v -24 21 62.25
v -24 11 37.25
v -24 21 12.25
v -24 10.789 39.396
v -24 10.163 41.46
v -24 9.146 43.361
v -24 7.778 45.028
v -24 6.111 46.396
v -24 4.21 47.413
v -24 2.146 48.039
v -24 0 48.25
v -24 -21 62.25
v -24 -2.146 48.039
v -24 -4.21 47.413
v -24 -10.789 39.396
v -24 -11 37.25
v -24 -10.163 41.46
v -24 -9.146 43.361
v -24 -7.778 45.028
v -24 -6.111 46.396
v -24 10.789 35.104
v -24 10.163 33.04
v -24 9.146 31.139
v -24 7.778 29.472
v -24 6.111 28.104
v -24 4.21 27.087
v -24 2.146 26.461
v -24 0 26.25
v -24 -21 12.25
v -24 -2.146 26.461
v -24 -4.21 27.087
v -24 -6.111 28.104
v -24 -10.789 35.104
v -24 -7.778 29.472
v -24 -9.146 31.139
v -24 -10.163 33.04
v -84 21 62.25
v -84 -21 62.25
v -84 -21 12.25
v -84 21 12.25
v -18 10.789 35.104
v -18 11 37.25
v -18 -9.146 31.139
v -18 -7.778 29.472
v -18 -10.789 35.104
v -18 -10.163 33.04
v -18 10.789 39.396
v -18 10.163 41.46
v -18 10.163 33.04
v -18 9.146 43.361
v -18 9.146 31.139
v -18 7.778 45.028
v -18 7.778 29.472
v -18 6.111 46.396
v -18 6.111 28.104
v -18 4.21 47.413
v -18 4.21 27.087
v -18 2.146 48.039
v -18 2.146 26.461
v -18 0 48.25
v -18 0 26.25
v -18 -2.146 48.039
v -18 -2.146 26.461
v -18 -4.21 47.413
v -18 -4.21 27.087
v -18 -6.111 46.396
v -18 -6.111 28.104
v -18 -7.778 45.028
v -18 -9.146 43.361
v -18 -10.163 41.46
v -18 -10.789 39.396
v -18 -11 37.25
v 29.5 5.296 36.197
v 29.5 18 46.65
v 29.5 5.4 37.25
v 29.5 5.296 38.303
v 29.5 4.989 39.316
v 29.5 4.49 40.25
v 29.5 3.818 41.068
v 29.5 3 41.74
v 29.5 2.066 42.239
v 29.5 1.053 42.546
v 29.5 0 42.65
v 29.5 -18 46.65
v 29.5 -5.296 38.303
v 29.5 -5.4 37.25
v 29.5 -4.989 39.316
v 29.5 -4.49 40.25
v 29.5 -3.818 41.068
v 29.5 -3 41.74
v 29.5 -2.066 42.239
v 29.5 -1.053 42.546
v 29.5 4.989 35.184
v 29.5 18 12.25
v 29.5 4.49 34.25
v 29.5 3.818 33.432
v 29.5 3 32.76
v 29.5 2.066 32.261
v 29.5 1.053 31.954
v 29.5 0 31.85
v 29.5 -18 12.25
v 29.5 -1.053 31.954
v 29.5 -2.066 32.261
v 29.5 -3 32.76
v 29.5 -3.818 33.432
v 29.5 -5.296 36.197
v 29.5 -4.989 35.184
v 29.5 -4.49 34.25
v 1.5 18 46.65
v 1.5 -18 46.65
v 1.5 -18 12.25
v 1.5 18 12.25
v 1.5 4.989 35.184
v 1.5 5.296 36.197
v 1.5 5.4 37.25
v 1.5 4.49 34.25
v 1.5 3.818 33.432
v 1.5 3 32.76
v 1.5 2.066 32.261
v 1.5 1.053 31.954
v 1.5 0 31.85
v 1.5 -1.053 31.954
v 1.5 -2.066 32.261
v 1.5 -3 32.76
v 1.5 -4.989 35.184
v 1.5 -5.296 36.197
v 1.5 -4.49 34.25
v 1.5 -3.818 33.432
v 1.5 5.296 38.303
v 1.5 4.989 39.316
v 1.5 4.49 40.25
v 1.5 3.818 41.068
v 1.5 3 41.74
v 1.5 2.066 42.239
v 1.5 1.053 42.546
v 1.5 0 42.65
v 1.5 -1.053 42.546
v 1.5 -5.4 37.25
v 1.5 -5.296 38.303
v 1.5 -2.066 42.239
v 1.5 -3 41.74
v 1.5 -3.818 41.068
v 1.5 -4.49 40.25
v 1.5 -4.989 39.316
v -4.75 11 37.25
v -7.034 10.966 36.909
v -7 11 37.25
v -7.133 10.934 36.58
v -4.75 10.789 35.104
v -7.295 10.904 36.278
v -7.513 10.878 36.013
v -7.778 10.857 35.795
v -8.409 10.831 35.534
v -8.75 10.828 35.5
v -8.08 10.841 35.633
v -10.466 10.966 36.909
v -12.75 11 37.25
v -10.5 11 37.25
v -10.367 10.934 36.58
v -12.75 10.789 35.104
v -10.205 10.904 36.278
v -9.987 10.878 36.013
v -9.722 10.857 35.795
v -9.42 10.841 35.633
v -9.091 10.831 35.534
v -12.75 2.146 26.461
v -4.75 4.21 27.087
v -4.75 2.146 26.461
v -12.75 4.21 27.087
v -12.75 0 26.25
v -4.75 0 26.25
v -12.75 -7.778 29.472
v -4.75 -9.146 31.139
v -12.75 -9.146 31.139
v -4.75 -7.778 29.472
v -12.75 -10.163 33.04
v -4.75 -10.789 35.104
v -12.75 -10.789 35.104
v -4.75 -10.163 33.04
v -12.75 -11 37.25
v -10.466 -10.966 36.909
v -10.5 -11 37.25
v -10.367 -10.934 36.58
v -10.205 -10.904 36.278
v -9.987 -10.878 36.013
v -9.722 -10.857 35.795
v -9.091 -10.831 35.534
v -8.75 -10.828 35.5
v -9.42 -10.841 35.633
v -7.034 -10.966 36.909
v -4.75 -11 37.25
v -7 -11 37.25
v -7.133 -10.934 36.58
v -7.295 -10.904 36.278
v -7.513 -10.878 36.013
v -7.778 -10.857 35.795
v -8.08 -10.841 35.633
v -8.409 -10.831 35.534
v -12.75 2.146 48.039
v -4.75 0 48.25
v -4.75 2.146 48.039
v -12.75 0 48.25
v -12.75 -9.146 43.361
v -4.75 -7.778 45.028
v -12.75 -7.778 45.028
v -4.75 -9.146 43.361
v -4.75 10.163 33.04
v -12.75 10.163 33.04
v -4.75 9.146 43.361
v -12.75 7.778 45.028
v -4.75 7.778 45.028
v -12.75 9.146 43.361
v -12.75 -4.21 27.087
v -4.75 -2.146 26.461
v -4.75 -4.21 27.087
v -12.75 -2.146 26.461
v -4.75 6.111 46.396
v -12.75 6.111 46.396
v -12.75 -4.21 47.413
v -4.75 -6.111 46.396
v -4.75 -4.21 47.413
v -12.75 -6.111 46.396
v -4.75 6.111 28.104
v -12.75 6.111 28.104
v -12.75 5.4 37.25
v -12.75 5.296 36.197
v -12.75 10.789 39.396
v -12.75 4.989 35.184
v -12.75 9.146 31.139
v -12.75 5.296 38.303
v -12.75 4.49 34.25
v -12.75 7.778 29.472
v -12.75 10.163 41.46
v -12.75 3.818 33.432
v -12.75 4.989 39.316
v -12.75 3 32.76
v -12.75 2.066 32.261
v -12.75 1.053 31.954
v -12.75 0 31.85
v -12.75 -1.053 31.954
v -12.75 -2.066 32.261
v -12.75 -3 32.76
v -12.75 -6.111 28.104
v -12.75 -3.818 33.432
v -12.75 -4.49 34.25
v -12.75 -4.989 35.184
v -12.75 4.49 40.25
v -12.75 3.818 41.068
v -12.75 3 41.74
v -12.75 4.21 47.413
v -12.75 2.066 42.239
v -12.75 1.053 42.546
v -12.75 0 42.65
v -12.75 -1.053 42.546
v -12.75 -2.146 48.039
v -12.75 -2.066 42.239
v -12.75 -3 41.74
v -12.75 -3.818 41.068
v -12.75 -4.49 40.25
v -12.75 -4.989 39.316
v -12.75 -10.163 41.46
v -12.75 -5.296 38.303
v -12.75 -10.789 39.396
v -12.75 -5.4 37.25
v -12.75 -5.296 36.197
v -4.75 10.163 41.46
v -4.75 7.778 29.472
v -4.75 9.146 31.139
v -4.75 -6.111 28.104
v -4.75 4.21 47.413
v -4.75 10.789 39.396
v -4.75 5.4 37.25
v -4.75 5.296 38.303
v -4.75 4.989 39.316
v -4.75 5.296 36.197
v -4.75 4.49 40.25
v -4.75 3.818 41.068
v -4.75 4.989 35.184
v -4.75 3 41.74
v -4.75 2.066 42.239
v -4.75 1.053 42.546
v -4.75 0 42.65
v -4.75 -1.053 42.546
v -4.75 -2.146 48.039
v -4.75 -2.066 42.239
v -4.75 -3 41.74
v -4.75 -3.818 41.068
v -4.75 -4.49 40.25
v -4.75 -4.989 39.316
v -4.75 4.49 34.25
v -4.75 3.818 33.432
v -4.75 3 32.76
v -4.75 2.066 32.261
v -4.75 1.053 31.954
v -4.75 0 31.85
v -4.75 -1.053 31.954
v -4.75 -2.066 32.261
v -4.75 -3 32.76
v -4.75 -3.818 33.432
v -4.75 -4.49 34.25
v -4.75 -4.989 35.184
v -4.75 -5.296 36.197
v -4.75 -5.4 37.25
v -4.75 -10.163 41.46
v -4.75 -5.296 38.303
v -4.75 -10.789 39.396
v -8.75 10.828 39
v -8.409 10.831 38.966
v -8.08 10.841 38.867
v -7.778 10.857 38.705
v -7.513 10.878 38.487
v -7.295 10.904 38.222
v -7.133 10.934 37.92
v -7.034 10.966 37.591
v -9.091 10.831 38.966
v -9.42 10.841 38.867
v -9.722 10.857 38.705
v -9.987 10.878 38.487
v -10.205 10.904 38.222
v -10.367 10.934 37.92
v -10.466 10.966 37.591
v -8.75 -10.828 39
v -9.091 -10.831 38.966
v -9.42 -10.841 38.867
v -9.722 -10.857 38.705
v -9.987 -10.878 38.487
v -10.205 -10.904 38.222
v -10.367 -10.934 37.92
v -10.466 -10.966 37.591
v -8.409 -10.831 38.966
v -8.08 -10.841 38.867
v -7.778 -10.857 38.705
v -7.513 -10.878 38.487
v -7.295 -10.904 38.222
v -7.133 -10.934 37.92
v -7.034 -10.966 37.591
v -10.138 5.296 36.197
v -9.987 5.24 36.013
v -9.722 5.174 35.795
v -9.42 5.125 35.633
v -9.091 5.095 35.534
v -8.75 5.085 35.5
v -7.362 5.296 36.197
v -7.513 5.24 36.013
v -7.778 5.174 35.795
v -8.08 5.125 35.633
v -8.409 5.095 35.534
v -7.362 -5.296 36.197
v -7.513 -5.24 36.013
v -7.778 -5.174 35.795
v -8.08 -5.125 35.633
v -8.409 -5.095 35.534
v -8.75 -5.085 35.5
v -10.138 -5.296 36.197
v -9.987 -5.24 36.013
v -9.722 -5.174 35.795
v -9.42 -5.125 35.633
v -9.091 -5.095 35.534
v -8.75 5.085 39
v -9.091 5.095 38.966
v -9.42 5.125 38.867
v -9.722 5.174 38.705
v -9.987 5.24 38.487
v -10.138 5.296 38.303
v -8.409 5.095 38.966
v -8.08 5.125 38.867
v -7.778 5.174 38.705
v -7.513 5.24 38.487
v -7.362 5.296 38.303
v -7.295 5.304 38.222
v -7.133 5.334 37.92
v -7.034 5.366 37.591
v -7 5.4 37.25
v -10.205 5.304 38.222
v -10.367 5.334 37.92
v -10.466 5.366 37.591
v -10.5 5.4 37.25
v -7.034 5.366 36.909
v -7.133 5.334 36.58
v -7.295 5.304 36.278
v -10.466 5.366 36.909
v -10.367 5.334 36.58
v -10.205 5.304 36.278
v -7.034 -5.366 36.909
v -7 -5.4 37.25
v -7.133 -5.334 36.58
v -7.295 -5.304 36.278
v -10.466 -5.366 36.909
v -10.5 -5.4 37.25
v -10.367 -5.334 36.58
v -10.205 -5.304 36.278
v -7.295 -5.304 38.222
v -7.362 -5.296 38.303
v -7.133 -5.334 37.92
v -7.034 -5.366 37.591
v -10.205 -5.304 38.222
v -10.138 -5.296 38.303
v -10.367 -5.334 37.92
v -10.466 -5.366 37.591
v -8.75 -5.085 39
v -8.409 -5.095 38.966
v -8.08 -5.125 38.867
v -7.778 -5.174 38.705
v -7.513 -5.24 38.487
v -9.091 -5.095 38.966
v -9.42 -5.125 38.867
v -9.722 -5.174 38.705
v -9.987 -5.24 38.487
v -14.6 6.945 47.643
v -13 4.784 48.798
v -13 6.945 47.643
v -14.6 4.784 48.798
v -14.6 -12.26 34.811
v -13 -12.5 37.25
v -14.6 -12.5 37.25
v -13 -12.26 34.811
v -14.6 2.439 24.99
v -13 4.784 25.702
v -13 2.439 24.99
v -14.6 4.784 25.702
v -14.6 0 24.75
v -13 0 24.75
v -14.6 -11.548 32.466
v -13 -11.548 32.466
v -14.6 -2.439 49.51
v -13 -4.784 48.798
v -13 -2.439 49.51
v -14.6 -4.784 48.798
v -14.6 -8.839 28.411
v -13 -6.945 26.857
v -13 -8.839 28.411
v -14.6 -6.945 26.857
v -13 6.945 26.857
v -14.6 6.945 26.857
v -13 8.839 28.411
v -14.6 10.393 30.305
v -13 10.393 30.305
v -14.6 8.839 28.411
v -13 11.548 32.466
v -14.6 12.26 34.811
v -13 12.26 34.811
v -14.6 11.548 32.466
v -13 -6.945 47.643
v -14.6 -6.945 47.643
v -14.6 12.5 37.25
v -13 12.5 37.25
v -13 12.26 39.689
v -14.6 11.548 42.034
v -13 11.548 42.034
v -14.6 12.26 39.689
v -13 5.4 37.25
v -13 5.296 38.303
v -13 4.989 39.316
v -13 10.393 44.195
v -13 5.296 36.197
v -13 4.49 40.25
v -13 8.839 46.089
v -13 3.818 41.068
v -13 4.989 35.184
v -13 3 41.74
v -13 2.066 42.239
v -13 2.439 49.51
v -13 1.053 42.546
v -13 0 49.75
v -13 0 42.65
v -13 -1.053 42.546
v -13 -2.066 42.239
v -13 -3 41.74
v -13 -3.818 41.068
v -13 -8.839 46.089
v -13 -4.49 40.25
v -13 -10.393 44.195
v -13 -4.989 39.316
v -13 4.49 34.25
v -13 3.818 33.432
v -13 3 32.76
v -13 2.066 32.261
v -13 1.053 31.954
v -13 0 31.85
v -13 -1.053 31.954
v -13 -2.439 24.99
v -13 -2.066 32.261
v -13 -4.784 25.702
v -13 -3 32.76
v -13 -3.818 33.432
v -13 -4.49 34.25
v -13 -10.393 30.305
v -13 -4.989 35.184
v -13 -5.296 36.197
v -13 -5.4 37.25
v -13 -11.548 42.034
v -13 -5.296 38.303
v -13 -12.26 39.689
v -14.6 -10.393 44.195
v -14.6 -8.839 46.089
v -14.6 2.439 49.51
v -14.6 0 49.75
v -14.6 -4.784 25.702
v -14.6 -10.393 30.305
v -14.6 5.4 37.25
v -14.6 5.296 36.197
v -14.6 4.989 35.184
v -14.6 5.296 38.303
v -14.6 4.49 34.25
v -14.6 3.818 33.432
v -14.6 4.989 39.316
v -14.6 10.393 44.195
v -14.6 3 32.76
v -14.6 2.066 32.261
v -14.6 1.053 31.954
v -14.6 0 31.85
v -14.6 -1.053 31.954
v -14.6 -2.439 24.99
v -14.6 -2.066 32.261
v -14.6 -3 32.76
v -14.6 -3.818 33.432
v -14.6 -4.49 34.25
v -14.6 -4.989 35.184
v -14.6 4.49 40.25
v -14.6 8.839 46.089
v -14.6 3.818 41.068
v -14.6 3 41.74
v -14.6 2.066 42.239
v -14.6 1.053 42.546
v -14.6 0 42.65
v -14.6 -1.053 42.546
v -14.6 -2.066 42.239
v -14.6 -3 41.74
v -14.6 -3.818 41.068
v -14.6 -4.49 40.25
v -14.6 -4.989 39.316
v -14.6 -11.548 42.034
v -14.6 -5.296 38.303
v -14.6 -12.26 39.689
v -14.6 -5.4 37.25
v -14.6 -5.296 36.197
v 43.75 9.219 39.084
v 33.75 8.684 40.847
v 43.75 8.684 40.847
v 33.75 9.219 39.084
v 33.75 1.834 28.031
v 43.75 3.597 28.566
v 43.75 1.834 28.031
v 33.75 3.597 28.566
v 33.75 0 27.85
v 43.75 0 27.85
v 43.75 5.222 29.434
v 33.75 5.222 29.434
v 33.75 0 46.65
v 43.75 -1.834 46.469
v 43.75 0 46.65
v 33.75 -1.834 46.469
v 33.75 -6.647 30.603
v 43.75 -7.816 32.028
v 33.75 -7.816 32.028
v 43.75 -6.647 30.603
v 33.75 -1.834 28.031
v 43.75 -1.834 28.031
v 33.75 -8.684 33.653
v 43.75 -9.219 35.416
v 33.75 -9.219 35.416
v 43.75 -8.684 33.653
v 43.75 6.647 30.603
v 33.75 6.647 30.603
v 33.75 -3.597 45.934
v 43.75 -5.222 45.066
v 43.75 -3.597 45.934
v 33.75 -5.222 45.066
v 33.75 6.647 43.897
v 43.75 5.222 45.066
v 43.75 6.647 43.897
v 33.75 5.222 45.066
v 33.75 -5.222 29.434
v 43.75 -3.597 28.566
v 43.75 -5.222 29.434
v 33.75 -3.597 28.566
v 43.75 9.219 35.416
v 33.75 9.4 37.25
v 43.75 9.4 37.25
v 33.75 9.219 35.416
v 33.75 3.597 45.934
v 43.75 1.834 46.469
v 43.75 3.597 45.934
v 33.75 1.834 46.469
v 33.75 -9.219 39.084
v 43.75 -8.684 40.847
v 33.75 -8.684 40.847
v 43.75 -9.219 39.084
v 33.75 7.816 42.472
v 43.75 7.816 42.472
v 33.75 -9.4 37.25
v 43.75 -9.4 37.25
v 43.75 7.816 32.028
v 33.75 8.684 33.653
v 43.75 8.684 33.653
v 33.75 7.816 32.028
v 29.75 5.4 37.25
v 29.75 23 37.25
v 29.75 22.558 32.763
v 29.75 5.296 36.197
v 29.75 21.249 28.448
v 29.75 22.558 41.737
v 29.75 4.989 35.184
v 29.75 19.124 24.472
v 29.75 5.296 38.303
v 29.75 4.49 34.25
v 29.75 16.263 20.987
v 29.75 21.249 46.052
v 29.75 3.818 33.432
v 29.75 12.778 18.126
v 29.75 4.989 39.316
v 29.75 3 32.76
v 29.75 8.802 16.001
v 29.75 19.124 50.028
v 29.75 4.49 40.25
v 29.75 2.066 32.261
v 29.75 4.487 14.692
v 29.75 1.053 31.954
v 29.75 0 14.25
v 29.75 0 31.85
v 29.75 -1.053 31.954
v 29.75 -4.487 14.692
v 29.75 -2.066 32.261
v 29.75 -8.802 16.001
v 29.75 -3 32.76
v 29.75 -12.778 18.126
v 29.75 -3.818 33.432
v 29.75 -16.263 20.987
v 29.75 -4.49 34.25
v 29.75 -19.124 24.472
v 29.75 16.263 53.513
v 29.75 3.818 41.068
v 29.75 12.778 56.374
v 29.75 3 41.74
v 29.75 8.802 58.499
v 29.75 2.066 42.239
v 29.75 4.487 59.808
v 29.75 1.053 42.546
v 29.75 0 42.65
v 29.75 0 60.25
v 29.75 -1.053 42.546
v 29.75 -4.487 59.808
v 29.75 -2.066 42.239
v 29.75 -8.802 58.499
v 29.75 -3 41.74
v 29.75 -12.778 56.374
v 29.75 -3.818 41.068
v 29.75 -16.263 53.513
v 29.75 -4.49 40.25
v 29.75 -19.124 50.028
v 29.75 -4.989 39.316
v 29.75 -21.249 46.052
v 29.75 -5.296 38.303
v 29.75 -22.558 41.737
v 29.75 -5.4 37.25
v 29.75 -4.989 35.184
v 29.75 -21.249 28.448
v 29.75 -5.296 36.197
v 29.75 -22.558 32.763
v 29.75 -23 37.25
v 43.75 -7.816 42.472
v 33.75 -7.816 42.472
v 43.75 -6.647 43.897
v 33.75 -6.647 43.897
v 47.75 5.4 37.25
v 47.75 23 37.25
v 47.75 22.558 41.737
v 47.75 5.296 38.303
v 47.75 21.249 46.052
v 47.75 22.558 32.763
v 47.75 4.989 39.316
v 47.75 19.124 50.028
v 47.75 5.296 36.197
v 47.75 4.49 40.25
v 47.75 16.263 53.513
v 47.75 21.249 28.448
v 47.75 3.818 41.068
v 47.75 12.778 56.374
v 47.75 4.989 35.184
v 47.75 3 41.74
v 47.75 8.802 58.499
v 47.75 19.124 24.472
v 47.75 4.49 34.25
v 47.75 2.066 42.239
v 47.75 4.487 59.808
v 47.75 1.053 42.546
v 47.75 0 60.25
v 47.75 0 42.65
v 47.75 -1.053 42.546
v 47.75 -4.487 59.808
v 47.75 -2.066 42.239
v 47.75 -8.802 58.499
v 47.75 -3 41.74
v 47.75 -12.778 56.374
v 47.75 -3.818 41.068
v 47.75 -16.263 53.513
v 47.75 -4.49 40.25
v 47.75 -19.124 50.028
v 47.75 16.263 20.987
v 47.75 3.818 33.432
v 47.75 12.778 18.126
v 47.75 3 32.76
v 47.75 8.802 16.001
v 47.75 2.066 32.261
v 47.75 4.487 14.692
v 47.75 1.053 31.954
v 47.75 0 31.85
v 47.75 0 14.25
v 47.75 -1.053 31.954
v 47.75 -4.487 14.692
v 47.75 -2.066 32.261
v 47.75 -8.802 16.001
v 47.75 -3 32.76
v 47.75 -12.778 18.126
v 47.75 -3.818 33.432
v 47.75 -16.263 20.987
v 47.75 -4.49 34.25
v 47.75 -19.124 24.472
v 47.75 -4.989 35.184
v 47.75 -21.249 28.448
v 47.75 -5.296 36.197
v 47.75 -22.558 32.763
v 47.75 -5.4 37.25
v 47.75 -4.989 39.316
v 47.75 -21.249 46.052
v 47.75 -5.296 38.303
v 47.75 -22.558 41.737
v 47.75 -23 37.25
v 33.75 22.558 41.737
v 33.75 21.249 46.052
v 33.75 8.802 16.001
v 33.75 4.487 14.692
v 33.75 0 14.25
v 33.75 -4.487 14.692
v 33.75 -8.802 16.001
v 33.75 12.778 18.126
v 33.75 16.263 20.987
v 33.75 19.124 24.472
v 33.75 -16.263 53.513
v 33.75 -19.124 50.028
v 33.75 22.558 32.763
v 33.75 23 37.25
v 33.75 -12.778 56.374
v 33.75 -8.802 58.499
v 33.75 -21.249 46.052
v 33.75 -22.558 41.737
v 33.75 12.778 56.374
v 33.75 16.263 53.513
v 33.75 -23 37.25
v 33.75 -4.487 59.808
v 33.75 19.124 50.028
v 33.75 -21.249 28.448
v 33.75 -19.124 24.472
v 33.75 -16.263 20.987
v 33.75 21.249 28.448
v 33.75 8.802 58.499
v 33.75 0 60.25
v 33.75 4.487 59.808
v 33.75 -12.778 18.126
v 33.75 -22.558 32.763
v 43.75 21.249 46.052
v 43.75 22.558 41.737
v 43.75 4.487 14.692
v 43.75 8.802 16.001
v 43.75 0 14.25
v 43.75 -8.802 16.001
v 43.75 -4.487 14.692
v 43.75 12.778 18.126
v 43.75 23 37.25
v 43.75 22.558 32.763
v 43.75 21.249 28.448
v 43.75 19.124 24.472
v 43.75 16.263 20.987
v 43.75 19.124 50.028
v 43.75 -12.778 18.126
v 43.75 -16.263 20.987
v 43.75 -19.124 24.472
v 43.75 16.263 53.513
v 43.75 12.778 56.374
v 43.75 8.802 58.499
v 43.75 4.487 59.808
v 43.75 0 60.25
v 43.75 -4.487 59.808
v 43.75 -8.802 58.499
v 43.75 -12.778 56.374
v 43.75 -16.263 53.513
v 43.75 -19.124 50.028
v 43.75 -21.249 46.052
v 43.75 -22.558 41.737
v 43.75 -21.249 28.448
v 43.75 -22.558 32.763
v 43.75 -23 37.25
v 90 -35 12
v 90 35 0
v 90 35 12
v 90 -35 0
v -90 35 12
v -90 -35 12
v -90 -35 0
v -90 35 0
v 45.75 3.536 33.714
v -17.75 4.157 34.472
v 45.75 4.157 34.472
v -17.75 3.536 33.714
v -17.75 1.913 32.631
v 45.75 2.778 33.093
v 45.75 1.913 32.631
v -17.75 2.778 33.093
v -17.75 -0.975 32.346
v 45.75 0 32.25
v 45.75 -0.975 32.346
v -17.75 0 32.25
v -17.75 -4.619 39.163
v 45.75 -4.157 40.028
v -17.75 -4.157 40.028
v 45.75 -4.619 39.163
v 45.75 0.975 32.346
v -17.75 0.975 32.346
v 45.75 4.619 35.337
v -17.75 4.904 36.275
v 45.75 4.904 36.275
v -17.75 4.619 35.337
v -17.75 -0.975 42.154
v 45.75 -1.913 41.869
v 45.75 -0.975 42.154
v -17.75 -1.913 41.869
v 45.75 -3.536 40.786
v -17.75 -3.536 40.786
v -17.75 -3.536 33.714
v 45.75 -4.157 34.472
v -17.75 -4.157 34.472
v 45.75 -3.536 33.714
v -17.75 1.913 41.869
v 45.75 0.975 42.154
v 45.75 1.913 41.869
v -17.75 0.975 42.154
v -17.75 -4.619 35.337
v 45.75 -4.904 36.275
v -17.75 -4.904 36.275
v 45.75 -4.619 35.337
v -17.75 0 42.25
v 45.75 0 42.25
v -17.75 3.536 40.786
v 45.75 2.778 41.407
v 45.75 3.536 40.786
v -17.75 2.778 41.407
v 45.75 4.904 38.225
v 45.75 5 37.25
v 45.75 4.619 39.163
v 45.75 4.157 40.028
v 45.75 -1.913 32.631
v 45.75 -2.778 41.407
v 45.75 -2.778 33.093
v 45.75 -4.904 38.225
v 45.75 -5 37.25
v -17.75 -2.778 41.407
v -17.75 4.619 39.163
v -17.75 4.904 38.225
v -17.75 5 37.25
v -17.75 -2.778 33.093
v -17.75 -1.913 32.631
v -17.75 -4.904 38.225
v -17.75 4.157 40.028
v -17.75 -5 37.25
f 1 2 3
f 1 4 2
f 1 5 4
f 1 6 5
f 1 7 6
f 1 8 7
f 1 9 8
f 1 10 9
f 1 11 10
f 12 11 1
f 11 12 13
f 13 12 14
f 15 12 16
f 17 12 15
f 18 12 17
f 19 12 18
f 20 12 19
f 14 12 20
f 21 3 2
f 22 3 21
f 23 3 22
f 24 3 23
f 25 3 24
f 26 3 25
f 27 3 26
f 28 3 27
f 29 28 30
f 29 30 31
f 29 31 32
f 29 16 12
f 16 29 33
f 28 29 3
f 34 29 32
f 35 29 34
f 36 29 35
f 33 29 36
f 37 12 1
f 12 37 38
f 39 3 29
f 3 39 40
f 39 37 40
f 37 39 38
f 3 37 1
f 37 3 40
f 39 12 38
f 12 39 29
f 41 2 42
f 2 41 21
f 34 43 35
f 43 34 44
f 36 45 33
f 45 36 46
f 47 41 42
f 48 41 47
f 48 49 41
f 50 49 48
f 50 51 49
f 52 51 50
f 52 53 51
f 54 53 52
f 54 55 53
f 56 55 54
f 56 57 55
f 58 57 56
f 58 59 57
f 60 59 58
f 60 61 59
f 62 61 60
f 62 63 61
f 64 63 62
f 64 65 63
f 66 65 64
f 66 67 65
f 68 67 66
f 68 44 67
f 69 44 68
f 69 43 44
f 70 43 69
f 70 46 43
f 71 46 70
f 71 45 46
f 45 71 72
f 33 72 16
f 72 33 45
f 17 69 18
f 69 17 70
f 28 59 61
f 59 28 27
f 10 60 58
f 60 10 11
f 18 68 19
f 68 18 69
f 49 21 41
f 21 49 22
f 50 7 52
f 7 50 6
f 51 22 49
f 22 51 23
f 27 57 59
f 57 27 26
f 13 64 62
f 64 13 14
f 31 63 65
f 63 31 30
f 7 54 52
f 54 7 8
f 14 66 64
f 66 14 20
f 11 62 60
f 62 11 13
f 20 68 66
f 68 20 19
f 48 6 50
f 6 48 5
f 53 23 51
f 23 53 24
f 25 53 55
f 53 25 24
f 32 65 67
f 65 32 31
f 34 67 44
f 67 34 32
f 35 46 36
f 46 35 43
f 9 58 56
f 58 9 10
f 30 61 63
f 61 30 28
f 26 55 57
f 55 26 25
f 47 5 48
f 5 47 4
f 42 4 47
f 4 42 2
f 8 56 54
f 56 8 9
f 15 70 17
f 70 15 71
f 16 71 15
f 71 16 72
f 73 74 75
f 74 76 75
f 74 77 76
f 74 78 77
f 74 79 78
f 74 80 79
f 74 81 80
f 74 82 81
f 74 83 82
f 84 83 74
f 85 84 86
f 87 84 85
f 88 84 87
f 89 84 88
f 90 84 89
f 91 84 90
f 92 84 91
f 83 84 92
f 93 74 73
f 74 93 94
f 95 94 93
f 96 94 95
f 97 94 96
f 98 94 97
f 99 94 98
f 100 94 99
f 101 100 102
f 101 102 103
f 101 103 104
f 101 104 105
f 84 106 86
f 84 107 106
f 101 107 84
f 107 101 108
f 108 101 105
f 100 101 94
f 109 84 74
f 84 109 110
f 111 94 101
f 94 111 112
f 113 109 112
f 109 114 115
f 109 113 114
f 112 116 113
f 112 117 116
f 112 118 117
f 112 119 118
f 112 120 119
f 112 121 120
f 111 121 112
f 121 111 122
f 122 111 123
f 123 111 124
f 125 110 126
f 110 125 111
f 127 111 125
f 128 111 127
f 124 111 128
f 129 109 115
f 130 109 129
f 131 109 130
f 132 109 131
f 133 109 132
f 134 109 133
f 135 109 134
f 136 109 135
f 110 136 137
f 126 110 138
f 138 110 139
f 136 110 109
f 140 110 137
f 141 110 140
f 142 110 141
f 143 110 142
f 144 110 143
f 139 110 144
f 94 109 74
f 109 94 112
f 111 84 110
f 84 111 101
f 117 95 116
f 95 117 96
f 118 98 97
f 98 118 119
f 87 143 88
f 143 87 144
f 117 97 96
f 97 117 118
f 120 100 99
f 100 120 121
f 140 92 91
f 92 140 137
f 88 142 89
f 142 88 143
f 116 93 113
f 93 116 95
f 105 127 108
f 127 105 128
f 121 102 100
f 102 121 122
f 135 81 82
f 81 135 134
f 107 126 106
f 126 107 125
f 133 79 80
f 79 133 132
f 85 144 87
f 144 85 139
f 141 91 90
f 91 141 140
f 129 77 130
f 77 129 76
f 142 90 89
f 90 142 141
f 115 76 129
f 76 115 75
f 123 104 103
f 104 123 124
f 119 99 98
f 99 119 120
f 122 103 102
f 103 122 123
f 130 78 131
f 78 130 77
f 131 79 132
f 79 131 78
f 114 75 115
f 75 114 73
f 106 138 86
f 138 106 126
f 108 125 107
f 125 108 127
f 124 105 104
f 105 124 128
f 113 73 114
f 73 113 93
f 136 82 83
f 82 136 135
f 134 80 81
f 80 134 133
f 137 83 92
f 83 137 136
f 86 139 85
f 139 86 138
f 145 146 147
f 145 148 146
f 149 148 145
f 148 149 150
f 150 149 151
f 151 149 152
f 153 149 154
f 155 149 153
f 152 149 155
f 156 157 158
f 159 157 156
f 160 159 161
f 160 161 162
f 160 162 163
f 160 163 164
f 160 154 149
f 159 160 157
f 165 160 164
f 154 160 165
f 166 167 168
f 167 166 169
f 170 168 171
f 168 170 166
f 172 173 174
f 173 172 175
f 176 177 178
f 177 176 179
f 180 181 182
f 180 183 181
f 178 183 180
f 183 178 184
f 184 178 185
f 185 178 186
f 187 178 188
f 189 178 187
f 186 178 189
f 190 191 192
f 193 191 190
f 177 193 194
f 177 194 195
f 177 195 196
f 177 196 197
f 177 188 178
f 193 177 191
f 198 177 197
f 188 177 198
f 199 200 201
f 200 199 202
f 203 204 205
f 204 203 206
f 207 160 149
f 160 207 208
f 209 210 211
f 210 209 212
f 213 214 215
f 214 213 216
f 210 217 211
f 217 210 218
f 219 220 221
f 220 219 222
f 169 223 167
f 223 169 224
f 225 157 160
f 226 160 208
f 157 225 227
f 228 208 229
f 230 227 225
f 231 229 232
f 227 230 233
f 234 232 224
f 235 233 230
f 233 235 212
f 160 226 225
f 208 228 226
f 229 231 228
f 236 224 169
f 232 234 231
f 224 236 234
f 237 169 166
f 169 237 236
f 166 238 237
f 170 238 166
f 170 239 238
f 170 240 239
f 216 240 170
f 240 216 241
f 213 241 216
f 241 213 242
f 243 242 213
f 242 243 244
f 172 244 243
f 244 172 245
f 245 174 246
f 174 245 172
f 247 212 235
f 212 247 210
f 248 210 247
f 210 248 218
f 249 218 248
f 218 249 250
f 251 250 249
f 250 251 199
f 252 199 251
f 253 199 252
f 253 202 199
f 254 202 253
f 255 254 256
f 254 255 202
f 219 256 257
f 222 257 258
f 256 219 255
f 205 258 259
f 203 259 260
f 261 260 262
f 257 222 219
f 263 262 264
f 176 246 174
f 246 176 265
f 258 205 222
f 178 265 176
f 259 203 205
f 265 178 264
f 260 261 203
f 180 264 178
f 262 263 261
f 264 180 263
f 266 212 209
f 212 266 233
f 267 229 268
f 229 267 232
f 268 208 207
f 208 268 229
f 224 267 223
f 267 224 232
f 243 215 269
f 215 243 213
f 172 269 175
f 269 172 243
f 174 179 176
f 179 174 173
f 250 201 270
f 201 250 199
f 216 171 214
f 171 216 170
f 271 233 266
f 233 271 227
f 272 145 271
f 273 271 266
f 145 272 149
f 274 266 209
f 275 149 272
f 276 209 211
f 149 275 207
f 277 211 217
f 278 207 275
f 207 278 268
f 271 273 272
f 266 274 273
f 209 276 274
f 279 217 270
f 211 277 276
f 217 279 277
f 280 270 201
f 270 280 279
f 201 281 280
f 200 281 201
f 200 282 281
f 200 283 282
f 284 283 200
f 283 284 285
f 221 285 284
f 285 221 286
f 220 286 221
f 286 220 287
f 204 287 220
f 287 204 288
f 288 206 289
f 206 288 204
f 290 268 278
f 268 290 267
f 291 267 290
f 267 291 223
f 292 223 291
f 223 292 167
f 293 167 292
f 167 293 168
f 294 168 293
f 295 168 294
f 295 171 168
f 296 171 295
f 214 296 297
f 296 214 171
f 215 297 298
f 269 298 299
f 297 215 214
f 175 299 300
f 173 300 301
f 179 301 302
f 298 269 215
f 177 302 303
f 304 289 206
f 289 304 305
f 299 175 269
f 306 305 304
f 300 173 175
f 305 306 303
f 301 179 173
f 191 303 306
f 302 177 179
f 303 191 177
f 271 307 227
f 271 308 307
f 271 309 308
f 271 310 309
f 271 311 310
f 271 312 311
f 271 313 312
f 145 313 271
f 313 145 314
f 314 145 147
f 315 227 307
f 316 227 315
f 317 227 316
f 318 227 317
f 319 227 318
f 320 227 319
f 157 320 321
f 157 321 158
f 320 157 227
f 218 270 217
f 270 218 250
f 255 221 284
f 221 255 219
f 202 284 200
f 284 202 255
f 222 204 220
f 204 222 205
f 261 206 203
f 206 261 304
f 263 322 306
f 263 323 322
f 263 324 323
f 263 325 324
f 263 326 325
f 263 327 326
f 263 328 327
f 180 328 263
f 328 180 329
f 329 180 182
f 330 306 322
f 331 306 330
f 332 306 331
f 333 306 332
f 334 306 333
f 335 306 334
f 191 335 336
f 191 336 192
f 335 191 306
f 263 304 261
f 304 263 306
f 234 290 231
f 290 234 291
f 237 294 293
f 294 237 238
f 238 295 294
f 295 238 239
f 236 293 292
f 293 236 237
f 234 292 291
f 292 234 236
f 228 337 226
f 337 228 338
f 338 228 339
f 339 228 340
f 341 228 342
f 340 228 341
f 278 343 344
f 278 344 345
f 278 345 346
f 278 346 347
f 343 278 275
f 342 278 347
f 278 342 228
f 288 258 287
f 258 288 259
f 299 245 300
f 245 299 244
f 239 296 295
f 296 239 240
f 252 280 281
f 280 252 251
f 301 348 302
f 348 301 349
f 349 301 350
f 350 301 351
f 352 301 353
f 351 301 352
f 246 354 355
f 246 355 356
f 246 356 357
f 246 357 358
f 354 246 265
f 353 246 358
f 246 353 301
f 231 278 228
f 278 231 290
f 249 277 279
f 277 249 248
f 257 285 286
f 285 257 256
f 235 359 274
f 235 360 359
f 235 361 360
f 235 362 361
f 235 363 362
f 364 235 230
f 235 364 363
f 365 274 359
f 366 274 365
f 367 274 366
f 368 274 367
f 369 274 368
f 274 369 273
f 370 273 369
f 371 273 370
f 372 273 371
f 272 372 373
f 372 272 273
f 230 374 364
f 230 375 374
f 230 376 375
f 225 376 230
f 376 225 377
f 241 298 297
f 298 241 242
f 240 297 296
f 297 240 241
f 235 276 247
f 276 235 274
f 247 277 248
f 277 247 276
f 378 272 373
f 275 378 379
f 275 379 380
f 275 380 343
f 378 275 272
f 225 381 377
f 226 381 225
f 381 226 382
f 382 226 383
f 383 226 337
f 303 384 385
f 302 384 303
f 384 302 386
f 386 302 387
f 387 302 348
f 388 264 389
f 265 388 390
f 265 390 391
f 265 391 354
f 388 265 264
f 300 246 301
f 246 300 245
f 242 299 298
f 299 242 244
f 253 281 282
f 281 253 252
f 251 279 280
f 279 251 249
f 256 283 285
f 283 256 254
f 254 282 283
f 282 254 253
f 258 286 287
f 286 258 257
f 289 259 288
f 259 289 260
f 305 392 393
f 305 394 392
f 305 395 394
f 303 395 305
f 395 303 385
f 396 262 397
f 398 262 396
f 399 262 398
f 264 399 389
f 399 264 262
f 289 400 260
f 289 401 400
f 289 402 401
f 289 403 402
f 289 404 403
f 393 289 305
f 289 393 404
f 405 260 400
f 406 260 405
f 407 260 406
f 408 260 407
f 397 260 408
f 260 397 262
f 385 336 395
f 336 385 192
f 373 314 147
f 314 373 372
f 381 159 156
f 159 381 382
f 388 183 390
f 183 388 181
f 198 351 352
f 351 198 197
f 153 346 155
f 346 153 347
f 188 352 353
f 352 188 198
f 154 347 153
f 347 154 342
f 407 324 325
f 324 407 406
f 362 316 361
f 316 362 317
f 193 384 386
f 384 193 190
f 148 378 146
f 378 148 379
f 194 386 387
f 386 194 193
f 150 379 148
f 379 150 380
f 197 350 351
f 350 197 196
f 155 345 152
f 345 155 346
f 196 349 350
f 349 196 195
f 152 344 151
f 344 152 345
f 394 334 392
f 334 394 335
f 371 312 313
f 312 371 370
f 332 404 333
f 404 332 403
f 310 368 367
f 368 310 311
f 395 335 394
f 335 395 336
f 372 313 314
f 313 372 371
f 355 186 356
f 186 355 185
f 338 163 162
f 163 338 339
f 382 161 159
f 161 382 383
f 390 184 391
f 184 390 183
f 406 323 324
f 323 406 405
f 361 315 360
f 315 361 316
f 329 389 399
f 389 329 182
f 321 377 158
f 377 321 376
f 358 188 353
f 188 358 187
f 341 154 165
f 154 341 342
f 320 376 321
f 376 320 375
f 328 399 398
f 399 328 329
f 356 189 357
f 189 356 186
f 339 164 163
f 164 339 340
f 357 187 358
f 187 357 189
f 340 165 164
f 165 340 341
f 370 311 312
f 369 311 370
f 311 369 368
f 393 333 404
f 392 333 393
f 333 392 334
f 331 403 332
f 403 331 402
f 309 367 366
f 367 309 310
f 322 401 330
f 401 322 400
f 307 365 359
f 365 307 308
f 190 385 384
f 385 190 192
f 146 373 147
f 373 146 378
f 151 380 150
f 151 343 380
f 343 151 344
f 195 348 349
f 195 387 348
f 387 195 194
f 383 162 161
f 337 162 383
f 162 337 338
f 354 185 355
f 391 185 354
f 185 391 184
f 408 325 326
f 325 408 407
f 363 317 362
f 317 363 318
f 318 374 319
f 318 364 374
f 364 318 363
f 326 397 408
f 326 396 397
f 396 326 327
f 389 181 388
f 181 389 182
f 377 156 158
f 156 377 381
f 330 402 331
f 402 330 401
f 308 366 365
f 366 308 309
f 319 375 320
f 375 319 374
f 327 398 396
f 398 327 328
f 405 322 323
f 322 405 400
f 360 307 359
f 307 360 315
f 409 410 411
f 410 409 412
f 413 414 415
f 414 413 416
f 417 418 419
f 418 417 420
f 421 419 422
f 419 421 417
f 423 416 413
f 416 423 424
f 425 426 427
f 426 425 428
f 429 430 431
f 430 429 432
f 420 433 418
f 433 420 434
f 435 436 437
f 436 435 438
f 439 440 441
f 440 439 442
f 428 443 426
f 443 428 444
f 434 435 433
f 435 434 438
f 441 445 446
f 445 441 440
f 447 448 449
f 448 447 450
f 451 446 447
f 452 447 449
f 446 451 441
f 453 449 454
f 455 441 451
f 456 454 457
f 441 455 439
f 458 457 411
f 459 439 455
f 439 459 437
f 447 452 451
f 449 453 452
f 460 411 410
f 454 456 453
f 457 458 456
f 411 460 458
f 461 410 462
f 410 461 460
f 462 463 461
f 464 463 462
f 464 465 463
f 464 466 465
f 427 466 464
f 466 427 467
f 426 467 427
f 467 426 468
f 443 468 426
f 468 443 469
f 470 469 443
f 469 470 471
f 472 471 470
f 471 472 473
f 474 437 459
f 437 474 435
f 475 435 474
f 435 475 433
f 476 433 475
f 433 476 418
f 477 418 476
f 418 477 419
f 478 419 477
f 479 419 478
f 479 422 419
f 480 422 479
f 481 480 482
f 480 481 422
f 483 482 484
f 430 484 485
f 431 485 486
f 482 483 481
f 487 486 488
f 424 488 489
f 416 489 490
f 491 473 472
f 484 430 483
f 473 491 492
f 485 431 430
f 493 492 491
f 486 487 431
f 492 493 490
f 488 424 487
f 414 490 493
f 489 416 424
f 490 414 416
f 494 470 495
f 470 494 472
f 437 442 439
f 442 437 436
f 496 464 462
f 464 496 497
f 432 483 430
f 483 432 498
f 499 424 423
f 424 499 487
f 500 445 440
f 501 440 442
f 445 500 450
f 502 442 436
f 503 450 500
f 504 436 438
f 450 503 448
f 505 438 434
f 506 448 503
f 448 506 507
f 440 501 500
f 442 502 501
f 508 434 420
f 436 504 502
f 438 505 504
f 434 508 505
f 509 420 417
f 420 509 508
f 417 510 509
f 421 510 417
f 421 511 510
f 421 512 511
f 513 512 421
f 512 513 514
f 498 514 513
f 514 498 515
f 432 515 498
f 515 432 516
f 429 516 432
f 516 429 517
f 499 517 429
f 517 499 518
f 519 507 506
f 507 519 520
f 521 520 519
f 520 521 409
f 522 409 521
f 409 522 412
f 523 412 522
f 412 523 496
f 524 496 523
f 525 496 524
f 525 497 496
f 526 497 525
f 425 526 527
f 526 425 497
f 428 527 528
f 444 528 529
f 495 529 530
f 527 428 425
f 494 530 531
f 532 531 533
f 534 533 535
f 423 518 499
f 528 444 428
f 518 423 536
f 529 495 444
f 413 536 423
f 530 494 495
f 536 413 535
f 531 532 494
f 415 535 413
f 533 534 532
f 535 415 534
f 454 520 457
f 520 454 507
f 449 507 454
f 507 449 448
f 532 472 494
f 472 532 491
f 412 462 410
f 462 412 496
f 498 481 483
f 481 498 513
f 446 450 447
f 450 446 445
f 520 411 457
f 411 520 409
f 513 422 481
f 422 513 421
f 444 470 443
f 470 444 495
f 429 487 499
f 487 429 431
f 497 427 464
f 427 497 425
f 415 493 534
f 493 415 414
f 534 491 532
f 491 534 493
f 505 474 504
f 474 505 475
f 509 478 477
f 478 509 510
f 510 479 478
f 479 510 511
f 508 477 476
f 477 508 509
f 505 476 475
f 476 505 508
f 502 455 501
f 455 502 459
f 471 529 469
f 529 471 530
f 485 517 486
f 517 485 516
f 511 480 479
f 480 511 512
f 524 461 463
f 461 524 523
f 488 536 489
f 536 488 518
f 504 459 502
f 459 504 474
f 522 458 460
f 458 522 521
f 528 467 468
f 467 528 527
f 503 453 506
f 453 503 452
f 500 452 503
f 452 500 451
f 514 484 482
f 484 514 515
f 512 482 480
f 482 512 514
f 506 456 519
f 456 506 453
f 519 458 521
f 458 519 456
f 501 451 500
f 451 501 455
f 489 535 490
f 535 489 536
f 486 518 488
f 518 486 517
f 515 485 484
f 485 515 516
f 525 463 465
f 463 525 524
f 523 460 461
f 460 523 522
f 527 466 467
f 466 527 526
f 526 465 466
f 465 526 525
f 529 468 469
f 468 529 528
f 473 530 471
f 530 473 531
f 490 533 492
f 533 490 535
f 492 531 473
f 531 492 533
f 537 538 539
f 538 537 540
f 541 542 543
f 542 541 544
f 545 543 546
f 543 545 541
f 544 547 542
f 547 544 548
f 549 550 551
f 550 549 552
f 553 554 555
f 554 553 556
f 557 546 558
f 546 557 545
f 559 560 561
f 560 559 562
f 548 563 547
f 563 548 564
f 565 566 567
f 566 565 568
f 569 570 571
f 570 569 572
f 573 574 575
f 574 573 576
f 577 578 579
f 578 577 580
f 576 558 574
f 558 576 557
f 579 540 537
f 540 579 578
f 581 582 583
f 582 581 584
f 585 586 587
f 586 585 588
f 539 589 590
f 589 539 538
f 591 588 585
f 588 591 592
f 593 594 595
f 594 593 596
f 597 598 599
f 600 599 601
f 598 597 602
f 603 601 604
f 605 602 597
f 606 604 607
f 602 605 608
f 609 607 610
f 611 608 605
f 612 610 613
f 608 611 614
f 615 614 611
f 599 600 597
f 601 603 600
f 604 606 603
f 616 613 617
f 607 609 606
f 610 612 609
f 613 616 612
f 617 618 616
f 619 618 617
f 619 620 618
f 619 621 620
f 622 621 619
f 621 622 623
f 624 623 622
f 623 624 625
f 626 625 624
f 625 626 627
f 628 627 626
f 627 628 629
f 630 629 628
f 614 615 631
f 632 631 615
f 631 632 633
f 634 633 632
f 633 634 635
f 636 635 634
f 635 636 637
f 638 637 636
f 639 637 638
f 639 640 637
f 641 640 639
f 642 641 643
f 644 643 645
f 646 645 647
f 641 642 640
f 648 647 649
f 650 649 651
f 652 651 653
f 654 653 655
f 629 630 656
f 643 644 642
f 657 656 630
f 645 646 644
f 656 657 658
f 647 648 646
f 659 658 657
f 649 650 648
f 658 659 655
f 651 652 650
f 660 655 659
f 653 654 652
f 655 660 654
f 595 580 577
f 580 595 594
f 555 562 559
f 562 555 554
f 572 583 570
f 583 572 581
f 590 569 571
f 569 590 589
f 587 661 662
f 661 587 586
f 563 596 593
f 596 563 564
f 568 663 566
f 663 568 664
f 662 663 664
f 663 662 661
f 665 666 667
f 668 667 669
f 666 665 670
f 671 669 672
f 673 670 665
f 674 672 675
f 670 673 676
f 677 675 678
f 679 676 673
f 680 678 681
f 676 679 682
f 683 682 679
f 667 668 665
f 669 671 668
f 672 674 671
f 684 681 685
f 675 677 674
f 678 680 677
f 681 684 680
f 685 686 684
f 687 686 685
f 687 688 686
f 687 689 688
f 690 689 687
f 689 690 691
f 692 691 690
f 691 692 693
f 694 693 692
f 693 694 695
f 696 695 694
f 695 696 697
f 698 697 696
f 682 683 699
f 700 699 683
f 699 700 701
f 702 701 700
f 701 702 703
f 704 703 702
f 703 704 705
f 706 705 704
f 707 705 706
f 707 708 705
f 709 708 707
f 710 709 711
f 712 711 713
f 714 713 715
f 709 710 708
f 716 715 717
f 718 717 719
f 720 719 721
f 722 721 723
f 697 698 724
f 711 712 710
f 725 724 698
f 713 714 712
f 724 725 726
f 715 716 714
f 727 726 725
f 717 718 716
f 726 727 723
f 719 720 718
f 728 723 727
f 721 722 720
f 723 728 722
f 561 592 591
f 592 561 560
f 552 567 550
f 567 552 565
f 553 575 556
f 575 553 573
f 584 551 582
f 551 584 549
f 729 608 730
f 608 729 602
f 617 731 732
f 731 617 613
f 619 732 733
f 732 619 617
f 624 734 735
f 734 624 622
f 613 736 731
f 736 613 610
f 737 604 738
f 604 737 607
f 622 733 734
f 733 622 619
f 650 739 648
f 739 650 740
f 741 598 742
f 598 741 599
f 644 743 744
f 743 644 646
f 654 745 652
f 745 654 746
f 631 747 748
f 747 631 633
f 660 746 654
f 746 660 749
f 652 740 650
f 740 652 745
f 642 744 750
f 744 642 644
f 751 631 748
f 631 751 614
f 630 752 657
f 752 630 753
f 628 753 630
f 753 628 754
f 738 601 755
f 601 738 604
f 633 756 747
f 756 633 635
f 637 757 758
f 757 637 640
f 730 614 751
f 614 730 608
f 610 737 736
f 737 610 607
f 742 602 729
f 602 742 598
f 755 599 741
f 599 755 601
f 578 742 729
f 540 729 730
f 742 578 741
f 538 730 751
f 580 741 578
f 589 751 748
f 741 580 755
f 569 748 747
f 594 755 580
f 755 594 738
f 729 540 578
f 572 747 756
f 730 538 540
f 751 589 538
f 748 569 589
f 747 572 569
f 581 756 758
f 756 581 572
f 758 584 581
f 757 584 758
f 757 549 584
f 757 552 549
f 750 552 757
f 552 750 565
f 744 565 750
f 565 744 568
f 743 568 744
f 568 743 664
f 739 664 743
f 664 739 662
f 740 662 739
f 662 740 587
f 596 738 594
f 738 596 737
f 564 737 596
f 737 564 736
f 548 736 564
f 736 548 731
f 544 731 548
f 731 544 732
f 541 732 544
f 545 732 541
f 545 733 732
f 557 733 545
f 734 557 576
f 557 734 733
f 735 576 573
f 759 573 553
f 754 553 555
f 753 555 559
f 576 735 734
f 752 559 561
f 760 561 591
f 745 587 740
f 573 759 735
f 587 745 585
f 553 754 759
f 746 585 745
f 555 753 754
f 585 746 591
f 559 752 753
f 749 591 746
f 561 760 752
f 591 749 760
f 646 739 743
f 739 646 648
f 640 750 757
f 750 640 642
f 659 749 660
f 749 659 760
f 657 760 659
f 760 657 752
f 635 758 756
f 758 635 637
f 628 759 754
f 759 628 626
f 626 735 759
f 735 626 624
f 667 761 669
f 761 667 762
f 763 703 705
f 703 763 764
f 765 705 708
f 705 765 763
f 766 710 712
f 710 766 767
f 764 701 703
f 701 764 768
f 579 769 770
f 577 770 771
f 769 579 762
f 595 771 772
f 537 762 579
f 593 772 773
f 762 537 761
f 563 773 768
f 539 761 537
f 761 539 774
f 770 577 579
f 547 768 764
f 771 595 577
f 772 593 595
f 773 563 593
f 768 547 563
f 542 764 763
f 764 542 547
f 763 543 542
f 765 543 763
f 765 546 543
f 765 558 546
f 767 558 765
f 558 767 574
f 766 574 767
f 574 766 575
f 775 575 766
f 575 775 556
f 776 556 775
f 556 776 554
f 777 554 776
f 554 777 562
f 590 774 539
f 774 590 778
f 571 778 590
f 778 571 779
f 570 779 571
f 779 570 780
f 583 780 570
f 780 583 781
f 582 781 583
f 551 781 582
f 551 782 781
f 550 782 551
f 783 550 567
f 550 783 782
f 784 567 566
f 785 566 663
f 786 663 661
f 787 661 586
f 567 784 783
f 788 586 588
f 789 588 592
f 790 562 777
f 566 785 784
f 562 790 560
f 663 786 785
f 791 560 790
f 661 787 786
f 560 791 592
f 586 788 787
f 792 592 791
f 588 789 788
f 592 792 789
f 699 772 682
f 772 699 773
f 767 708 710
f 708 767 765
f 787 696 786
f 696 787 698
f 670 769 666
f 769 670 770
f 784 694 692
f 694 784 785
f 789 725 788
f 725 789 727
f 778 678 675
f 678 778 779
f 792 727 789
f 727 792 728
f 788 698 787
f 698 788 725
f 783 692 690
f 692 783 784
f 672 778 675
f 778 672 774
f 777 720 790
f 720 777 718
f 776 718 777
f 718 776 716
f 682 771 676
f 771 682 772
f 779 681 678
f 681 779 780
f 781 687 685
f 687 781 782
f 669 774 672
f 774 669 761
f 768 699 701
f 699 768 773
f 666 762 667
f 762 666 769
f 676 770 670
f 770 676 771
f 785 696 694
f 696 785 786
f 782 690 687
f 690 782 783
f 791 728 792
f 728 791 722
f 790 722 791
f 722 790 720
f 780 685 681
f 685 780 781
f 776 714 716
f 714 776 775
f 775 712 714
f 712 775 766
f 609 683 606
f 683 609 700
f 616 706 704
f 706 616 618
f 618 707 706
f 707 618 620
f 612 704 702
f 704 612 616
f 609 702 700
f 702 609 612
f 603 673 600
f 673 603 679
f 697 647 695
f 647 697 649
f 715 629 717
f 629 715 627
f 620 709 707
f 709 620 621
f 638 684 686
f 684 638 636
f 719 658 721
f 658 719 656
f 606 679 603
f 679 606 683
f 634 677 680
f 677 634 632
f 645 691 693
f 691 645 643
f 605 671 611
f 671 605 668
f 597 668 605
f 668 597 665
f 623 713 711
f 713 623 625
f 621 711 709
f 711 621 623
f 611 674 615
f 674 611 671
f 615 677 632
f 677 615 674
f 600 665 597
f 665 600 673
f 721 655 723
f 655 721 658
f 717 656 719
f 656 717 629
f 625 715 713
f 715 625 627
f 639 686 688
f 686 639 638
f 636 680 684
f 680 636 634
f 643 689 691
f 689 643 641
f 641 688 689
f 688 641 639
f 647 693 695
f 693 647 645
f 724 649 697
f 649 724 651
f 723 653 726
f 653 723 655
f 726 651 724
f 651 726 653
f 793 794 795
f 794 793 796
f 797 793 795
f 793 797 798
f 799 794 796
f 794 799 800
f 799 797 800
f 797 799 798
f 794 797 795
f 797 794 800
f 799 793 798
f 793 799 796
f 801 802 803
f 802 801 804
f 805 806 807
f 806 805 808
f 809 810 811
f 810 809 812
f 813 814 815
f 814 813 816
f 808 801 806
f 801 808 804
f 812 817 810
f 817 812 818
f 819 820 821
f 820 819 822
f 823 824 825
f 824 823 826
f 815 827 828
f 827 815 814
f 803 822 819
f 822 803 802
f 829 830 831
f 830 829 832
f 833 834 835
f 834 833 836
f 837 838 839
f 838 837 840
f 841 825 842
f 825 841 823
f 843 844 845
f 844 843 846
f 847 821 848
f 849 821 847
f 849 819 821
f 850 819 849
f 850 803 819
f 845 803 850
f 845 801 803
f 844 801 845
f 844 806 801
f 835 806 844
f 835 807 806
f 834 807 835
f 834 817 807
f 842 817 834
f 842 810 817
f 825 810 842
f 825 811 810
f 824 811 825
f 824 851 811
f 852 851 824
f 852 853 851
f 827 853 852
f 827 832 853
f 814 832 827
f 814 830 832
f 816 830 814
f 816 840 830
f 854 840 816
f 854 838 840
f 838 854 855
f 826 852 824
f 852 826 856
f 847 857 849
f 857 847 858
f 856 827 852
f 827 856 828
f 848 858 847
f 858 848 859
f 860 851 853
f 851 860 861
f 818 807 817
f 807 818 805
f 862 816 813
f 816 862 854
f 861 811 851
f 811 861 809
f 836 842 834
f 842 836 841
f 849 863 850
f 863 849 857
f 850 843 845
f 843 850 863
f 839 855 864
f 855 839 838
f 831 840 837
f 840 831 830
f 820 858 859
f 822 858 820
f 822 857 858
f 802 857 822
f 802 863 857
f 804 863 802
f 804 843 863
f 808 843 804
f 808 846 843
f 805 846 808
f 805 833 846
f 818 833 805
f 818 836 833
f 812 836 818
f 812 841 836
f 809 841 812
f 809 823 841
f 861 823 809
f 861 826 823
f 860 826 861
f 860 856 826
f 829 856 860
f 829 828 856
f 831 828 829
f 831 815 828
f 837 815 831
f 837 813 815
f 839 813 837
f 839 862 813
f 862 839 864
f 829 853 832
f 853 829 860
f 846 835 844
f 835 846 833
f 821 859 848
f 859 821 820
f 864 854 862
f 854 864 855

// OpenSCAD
$fn = 32;

// ------------------------------------------------------------------------
// Motor drive station: motor 60 x 50 mm, shaft d10, pulley d46
// Every part is its own module, assembly() places every instance.
// ------------------------------------------------------------------------

// --- part 1 ---
module station_bed() {
  difference() {
    translate([-90, -35, 0]) cube([180, 70, 12]);
  }
}

// --- part 2 ---
module drive_motor() {
  union() {
    translate([-30, -21, 0]) cube([60, 42, 50]);
    translate([33, 0, 25]) rotate([0, 90, 0]) cylinder(h = 6, d = 22, center = true);
  }
}

// --- part 3 ---
module pillow_block() {
  difference() {
    translate([-14, -18, 0]) cube([28, 36, 34.4]);
    translate([0, 0, 25]) rotate([0, 90, 0]) cylinder(h = 30, d = 10.8, center = true);
  }
}

// --- part 4 ---
module drive_shaft() {
  translate([0, 0, -31.75]) cylinder(h = 63.5, d = 10);
}

// --- part 5 ---
module shaft_collar() {
  difference() {
    cylinder(h = 8, d = 22);
    translate([0, 0, -1]) cylinder(h = 10, d = 10.8);
    translate([0, 0, 4]) rotate([90, 0, 0]) cylinder(h = 24, d = 3.5, center = true);
  }
}

// --- part 6 ---
module collar_washer() {
  difference() {
      translate([0, 0, 0]) cylinder(h = 1.6, d = 25);
      translate([0, 0, -1]) cylinder(h = 3.6, d = 10.8);
    }
}

// --- part 7 ---
module drive_pulley() {
  difference() {
    union() {
      cylinder(h = 18, d = 18.8);
      cylinder(h = 4, d = 46);
      translate([0, 0, 14]) cylinder(h = 4, d = 46);
    }
    translate([0, 0, -1]) cylinder(h = 20, d = 10.8);
  }
}

// --- assembly ---
module assembly() {
  color([0.80, 0.24, 0.20]) translate([0, 0, 0]) rotate([0, 0, 0]) station_bed();
  color([0.20, 0.45, 0.75]) translate([-54, 0, 12.25]) rotate([0, 0, 0]) drive_motor();
  color([0.25, 0.62, 0.32]) translate([15.5, 0, 12.25]) rotate([0, 0, 0]) pillow_block();
  color([0.92, 0.70, 0.18]) translate([14, 0, 37.25]) rotate([0, 90, 0]) drive_shaft();
  color([0.58, 0.35, 0.70]) translate([-12.75, 0, 37.25]) rotate([0, 90, 0]) shaft_collar();
  color([0.16, 0.66, 0.66]) translate([-14.6, 0, 37.25]) rotate([0, 90, 0]) collar_washer();
  color([0.85, 0.48, 0.18]) translate([29.75, 0, 37.25]) rotate([0, 90, 0]) drive_pulley();
}

assembly();
